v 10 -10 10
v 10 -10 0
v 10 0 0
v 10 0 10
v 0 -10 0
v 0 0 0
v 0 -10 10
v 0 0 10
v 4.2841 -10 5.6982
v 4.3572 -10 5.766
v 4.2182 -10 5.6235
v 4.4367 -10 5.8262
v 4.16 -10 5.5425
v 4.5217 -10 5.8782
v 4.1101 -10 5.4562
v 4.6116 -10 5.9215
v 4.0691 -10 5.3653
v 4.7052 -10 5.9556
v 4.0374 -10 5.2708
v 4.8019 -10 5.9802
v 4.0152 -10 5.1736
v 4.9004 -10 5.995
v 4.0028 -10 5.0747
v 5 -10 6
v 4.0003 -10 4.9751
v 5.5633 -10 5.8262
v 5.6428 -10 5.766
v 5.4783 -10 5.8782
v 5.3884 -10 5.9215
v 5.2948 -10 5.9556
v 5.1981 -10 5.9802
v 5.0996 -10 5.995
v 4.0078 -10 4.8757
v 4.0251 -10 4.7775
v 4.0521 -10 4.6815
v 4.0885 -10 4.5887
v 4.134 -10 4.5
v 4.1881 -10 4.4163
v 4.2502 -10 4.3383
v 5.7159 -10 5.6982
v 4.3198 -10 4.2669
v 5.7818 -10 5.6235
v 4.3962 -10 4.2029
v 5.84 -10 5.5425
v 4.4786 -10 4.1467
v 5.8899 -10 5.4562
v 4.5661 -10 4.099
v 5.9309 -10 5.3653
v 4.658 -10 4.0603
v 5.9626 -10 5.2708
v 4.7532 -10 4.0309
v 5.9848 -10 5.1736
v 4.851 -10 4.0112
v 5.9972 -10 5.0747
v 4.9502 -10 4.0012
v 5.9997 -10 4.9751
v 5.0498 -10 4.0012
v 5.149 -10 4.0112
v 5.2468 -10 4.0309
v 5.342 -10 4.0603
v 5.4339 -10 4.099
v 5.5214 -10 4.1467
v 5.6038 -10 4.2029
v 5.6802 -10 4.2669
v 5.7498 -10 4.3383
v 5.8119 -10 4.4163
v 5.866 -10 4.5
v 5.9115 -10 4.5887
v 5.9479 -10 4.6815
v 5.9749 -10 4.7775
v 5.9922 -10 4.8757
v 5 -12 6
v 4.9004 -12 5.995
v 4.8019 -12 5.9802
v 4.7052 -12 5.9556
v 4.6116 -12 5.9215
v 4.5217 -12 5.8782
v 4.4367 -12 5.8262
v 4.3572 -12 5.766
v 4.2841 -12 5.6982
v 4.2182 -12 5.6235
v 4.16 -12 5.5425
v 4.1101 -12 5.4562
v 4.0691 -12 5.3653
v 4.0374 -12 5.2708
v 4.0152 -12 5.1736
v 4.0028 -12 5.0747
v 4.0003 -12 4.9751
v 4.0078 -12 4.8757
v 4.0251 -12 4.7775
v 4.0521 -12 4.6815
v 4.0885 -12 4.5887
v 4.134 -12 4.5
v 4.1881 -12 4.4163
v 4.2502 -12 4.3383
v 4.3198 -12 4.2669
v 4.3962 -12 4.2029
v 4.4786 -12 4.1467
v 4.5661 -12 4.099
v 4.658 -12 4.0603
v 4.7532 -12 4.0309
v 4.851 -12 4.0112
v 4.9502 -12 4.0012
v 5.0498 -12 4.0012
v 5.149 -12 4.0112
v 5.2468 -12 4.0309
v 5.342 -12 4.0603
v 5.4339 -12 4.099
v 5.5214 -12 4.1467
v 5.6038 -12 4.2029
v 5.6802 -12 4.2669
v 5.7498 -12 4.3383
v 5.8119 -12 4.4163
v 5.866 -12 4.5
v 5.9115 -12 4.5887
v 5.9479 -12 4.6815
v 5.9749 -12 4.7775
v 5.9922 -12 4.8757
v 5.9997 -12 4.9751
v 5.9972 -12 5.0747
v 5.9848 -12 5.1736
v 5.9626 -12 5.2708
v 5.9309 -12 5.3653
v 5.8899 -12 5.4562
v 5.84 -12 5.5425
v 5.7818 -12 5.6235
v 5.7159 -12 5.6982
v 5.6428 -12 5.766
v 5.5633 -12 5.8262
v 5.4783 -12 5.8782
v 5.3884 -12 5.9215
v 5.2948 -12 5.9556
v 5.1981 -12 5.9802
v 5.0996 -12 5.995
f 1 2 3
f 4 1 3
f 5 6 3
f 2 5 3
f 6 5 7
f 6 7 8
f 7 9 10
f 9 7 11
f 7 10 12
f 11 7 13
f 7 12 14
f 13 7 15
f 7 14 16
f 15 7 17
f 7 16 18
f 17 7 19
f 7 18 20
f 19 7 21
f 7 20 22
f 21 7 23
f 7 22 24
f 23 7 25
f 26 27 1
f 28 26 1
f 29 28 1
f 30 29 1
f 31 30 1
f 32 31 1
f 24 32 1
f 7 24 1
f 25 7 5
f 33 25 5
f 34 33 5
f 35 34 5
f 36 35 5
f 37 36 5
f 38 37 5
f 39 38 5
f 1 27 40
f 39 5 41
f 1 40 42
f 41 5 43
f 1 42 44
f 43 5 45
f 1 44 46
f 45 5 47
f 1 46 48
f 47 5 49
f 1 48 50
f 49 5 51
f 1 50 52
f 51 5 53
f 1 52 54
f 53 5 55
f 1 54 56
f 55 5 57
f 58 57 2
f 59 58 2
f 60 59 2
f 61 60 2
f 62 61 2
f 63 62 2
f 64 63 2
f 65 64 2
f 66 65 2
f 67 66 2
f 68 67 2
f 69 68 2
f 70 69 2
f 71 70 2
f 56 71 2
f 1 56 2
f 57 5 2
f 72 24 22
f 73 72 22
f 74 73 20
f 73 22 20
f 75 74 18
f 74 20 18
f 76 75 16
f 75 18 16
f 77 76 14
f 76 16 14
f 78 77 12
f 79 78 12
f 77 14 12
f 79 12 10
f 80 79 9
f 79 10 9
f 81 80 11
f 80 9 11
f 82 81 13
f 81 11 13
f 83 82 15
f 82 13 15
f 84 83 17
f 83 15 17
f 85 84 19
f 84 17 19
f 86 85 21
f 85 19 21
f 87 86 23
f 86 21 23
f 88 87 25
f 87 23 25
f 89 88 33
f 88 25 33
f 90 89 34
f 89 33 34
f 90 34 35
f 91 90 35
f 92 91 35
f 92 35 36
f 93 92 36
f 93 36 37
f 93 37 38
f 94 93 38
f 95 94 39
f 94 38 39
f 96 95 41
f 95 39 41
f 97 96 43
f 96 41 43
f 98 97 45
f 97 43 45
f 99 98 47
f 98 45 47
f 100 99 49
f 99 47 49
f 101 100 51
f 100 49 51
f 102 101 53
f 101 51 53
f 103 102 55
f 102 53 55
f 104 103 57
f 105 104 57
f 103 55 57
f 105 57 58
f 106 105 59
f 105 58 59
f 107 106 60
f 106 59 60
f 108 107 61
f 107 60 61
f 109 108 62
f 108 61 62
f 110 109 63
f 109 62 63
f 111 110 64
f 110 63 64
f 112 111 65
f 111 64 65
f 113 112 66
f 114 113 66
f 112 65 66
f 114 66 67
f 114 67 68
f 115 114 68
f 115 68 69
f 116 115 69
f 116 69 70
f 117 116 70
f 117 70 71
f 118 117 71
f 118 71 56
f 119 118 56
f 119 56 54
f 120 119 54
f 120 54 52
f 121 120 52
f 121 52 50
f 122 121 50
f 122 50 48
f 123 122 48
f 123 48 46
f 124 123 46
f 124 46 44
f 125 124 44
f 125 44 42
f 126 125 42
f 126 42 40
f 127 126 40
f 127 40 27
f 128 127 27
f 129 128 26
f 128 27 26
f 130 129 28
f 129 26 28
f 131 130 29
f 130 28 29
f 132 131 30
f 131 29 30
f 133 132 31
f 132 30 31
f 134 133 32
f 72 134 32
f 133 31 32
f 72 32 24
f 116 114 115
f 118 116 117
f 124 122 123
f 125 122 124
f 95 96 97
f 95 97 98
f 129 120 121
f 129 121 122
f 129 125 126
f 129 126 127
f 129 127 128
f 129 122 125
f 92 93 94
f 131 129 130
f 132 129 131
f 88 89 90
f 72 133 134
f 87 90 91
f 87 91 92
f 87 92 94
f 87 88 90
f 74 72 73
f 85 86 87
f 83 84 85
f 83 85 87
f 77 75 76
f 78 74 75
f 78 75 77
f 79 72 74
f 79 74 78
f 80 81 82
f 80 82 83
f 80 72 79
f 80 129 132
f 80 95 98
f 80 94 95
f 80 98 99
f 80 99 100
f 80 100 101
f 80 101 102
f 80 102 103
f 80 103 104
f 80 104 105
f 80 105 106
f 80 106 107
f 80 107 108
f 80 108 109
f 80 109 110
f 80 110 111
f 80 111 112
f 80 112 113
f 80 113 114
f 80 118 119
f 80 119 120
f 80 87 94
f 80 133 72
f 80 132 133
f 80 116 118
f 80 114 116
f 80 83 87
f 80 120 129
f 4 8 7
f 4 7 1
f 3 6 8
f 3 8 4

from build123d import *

# Parameters (mm, degrees)
SKETCH1_W           = 10
SKETCH1_H           = 10
BOSS_EXTRUDE1_DEPTH = 10
SKETCH2_R           = 1
BOSS_EXTRUDE2_DEPTH = 2


with BuildPart() as part:
    # Sketch1 → Boss-Extrude1 (new body)
    with BuildSketch(Plane.XY):
        with Locations((5, -5)):
            Rectangle(SKETCH1_W, SKETCH1_H)
    extrude(amount=BOSS_EXTRUDE1_DEPTH)

    # Sketch2 → Boss-Extrude2 (add)
    with BuildSketch(Plane.XZ.offset(10)):
        with Locations(Location((5, 5, 0), (0, 0, 90))):
            Circle(SKETCH2_R)
    extrude(amount=BOSS_EXTRUDE2_DEPTH)


solid = part.part
